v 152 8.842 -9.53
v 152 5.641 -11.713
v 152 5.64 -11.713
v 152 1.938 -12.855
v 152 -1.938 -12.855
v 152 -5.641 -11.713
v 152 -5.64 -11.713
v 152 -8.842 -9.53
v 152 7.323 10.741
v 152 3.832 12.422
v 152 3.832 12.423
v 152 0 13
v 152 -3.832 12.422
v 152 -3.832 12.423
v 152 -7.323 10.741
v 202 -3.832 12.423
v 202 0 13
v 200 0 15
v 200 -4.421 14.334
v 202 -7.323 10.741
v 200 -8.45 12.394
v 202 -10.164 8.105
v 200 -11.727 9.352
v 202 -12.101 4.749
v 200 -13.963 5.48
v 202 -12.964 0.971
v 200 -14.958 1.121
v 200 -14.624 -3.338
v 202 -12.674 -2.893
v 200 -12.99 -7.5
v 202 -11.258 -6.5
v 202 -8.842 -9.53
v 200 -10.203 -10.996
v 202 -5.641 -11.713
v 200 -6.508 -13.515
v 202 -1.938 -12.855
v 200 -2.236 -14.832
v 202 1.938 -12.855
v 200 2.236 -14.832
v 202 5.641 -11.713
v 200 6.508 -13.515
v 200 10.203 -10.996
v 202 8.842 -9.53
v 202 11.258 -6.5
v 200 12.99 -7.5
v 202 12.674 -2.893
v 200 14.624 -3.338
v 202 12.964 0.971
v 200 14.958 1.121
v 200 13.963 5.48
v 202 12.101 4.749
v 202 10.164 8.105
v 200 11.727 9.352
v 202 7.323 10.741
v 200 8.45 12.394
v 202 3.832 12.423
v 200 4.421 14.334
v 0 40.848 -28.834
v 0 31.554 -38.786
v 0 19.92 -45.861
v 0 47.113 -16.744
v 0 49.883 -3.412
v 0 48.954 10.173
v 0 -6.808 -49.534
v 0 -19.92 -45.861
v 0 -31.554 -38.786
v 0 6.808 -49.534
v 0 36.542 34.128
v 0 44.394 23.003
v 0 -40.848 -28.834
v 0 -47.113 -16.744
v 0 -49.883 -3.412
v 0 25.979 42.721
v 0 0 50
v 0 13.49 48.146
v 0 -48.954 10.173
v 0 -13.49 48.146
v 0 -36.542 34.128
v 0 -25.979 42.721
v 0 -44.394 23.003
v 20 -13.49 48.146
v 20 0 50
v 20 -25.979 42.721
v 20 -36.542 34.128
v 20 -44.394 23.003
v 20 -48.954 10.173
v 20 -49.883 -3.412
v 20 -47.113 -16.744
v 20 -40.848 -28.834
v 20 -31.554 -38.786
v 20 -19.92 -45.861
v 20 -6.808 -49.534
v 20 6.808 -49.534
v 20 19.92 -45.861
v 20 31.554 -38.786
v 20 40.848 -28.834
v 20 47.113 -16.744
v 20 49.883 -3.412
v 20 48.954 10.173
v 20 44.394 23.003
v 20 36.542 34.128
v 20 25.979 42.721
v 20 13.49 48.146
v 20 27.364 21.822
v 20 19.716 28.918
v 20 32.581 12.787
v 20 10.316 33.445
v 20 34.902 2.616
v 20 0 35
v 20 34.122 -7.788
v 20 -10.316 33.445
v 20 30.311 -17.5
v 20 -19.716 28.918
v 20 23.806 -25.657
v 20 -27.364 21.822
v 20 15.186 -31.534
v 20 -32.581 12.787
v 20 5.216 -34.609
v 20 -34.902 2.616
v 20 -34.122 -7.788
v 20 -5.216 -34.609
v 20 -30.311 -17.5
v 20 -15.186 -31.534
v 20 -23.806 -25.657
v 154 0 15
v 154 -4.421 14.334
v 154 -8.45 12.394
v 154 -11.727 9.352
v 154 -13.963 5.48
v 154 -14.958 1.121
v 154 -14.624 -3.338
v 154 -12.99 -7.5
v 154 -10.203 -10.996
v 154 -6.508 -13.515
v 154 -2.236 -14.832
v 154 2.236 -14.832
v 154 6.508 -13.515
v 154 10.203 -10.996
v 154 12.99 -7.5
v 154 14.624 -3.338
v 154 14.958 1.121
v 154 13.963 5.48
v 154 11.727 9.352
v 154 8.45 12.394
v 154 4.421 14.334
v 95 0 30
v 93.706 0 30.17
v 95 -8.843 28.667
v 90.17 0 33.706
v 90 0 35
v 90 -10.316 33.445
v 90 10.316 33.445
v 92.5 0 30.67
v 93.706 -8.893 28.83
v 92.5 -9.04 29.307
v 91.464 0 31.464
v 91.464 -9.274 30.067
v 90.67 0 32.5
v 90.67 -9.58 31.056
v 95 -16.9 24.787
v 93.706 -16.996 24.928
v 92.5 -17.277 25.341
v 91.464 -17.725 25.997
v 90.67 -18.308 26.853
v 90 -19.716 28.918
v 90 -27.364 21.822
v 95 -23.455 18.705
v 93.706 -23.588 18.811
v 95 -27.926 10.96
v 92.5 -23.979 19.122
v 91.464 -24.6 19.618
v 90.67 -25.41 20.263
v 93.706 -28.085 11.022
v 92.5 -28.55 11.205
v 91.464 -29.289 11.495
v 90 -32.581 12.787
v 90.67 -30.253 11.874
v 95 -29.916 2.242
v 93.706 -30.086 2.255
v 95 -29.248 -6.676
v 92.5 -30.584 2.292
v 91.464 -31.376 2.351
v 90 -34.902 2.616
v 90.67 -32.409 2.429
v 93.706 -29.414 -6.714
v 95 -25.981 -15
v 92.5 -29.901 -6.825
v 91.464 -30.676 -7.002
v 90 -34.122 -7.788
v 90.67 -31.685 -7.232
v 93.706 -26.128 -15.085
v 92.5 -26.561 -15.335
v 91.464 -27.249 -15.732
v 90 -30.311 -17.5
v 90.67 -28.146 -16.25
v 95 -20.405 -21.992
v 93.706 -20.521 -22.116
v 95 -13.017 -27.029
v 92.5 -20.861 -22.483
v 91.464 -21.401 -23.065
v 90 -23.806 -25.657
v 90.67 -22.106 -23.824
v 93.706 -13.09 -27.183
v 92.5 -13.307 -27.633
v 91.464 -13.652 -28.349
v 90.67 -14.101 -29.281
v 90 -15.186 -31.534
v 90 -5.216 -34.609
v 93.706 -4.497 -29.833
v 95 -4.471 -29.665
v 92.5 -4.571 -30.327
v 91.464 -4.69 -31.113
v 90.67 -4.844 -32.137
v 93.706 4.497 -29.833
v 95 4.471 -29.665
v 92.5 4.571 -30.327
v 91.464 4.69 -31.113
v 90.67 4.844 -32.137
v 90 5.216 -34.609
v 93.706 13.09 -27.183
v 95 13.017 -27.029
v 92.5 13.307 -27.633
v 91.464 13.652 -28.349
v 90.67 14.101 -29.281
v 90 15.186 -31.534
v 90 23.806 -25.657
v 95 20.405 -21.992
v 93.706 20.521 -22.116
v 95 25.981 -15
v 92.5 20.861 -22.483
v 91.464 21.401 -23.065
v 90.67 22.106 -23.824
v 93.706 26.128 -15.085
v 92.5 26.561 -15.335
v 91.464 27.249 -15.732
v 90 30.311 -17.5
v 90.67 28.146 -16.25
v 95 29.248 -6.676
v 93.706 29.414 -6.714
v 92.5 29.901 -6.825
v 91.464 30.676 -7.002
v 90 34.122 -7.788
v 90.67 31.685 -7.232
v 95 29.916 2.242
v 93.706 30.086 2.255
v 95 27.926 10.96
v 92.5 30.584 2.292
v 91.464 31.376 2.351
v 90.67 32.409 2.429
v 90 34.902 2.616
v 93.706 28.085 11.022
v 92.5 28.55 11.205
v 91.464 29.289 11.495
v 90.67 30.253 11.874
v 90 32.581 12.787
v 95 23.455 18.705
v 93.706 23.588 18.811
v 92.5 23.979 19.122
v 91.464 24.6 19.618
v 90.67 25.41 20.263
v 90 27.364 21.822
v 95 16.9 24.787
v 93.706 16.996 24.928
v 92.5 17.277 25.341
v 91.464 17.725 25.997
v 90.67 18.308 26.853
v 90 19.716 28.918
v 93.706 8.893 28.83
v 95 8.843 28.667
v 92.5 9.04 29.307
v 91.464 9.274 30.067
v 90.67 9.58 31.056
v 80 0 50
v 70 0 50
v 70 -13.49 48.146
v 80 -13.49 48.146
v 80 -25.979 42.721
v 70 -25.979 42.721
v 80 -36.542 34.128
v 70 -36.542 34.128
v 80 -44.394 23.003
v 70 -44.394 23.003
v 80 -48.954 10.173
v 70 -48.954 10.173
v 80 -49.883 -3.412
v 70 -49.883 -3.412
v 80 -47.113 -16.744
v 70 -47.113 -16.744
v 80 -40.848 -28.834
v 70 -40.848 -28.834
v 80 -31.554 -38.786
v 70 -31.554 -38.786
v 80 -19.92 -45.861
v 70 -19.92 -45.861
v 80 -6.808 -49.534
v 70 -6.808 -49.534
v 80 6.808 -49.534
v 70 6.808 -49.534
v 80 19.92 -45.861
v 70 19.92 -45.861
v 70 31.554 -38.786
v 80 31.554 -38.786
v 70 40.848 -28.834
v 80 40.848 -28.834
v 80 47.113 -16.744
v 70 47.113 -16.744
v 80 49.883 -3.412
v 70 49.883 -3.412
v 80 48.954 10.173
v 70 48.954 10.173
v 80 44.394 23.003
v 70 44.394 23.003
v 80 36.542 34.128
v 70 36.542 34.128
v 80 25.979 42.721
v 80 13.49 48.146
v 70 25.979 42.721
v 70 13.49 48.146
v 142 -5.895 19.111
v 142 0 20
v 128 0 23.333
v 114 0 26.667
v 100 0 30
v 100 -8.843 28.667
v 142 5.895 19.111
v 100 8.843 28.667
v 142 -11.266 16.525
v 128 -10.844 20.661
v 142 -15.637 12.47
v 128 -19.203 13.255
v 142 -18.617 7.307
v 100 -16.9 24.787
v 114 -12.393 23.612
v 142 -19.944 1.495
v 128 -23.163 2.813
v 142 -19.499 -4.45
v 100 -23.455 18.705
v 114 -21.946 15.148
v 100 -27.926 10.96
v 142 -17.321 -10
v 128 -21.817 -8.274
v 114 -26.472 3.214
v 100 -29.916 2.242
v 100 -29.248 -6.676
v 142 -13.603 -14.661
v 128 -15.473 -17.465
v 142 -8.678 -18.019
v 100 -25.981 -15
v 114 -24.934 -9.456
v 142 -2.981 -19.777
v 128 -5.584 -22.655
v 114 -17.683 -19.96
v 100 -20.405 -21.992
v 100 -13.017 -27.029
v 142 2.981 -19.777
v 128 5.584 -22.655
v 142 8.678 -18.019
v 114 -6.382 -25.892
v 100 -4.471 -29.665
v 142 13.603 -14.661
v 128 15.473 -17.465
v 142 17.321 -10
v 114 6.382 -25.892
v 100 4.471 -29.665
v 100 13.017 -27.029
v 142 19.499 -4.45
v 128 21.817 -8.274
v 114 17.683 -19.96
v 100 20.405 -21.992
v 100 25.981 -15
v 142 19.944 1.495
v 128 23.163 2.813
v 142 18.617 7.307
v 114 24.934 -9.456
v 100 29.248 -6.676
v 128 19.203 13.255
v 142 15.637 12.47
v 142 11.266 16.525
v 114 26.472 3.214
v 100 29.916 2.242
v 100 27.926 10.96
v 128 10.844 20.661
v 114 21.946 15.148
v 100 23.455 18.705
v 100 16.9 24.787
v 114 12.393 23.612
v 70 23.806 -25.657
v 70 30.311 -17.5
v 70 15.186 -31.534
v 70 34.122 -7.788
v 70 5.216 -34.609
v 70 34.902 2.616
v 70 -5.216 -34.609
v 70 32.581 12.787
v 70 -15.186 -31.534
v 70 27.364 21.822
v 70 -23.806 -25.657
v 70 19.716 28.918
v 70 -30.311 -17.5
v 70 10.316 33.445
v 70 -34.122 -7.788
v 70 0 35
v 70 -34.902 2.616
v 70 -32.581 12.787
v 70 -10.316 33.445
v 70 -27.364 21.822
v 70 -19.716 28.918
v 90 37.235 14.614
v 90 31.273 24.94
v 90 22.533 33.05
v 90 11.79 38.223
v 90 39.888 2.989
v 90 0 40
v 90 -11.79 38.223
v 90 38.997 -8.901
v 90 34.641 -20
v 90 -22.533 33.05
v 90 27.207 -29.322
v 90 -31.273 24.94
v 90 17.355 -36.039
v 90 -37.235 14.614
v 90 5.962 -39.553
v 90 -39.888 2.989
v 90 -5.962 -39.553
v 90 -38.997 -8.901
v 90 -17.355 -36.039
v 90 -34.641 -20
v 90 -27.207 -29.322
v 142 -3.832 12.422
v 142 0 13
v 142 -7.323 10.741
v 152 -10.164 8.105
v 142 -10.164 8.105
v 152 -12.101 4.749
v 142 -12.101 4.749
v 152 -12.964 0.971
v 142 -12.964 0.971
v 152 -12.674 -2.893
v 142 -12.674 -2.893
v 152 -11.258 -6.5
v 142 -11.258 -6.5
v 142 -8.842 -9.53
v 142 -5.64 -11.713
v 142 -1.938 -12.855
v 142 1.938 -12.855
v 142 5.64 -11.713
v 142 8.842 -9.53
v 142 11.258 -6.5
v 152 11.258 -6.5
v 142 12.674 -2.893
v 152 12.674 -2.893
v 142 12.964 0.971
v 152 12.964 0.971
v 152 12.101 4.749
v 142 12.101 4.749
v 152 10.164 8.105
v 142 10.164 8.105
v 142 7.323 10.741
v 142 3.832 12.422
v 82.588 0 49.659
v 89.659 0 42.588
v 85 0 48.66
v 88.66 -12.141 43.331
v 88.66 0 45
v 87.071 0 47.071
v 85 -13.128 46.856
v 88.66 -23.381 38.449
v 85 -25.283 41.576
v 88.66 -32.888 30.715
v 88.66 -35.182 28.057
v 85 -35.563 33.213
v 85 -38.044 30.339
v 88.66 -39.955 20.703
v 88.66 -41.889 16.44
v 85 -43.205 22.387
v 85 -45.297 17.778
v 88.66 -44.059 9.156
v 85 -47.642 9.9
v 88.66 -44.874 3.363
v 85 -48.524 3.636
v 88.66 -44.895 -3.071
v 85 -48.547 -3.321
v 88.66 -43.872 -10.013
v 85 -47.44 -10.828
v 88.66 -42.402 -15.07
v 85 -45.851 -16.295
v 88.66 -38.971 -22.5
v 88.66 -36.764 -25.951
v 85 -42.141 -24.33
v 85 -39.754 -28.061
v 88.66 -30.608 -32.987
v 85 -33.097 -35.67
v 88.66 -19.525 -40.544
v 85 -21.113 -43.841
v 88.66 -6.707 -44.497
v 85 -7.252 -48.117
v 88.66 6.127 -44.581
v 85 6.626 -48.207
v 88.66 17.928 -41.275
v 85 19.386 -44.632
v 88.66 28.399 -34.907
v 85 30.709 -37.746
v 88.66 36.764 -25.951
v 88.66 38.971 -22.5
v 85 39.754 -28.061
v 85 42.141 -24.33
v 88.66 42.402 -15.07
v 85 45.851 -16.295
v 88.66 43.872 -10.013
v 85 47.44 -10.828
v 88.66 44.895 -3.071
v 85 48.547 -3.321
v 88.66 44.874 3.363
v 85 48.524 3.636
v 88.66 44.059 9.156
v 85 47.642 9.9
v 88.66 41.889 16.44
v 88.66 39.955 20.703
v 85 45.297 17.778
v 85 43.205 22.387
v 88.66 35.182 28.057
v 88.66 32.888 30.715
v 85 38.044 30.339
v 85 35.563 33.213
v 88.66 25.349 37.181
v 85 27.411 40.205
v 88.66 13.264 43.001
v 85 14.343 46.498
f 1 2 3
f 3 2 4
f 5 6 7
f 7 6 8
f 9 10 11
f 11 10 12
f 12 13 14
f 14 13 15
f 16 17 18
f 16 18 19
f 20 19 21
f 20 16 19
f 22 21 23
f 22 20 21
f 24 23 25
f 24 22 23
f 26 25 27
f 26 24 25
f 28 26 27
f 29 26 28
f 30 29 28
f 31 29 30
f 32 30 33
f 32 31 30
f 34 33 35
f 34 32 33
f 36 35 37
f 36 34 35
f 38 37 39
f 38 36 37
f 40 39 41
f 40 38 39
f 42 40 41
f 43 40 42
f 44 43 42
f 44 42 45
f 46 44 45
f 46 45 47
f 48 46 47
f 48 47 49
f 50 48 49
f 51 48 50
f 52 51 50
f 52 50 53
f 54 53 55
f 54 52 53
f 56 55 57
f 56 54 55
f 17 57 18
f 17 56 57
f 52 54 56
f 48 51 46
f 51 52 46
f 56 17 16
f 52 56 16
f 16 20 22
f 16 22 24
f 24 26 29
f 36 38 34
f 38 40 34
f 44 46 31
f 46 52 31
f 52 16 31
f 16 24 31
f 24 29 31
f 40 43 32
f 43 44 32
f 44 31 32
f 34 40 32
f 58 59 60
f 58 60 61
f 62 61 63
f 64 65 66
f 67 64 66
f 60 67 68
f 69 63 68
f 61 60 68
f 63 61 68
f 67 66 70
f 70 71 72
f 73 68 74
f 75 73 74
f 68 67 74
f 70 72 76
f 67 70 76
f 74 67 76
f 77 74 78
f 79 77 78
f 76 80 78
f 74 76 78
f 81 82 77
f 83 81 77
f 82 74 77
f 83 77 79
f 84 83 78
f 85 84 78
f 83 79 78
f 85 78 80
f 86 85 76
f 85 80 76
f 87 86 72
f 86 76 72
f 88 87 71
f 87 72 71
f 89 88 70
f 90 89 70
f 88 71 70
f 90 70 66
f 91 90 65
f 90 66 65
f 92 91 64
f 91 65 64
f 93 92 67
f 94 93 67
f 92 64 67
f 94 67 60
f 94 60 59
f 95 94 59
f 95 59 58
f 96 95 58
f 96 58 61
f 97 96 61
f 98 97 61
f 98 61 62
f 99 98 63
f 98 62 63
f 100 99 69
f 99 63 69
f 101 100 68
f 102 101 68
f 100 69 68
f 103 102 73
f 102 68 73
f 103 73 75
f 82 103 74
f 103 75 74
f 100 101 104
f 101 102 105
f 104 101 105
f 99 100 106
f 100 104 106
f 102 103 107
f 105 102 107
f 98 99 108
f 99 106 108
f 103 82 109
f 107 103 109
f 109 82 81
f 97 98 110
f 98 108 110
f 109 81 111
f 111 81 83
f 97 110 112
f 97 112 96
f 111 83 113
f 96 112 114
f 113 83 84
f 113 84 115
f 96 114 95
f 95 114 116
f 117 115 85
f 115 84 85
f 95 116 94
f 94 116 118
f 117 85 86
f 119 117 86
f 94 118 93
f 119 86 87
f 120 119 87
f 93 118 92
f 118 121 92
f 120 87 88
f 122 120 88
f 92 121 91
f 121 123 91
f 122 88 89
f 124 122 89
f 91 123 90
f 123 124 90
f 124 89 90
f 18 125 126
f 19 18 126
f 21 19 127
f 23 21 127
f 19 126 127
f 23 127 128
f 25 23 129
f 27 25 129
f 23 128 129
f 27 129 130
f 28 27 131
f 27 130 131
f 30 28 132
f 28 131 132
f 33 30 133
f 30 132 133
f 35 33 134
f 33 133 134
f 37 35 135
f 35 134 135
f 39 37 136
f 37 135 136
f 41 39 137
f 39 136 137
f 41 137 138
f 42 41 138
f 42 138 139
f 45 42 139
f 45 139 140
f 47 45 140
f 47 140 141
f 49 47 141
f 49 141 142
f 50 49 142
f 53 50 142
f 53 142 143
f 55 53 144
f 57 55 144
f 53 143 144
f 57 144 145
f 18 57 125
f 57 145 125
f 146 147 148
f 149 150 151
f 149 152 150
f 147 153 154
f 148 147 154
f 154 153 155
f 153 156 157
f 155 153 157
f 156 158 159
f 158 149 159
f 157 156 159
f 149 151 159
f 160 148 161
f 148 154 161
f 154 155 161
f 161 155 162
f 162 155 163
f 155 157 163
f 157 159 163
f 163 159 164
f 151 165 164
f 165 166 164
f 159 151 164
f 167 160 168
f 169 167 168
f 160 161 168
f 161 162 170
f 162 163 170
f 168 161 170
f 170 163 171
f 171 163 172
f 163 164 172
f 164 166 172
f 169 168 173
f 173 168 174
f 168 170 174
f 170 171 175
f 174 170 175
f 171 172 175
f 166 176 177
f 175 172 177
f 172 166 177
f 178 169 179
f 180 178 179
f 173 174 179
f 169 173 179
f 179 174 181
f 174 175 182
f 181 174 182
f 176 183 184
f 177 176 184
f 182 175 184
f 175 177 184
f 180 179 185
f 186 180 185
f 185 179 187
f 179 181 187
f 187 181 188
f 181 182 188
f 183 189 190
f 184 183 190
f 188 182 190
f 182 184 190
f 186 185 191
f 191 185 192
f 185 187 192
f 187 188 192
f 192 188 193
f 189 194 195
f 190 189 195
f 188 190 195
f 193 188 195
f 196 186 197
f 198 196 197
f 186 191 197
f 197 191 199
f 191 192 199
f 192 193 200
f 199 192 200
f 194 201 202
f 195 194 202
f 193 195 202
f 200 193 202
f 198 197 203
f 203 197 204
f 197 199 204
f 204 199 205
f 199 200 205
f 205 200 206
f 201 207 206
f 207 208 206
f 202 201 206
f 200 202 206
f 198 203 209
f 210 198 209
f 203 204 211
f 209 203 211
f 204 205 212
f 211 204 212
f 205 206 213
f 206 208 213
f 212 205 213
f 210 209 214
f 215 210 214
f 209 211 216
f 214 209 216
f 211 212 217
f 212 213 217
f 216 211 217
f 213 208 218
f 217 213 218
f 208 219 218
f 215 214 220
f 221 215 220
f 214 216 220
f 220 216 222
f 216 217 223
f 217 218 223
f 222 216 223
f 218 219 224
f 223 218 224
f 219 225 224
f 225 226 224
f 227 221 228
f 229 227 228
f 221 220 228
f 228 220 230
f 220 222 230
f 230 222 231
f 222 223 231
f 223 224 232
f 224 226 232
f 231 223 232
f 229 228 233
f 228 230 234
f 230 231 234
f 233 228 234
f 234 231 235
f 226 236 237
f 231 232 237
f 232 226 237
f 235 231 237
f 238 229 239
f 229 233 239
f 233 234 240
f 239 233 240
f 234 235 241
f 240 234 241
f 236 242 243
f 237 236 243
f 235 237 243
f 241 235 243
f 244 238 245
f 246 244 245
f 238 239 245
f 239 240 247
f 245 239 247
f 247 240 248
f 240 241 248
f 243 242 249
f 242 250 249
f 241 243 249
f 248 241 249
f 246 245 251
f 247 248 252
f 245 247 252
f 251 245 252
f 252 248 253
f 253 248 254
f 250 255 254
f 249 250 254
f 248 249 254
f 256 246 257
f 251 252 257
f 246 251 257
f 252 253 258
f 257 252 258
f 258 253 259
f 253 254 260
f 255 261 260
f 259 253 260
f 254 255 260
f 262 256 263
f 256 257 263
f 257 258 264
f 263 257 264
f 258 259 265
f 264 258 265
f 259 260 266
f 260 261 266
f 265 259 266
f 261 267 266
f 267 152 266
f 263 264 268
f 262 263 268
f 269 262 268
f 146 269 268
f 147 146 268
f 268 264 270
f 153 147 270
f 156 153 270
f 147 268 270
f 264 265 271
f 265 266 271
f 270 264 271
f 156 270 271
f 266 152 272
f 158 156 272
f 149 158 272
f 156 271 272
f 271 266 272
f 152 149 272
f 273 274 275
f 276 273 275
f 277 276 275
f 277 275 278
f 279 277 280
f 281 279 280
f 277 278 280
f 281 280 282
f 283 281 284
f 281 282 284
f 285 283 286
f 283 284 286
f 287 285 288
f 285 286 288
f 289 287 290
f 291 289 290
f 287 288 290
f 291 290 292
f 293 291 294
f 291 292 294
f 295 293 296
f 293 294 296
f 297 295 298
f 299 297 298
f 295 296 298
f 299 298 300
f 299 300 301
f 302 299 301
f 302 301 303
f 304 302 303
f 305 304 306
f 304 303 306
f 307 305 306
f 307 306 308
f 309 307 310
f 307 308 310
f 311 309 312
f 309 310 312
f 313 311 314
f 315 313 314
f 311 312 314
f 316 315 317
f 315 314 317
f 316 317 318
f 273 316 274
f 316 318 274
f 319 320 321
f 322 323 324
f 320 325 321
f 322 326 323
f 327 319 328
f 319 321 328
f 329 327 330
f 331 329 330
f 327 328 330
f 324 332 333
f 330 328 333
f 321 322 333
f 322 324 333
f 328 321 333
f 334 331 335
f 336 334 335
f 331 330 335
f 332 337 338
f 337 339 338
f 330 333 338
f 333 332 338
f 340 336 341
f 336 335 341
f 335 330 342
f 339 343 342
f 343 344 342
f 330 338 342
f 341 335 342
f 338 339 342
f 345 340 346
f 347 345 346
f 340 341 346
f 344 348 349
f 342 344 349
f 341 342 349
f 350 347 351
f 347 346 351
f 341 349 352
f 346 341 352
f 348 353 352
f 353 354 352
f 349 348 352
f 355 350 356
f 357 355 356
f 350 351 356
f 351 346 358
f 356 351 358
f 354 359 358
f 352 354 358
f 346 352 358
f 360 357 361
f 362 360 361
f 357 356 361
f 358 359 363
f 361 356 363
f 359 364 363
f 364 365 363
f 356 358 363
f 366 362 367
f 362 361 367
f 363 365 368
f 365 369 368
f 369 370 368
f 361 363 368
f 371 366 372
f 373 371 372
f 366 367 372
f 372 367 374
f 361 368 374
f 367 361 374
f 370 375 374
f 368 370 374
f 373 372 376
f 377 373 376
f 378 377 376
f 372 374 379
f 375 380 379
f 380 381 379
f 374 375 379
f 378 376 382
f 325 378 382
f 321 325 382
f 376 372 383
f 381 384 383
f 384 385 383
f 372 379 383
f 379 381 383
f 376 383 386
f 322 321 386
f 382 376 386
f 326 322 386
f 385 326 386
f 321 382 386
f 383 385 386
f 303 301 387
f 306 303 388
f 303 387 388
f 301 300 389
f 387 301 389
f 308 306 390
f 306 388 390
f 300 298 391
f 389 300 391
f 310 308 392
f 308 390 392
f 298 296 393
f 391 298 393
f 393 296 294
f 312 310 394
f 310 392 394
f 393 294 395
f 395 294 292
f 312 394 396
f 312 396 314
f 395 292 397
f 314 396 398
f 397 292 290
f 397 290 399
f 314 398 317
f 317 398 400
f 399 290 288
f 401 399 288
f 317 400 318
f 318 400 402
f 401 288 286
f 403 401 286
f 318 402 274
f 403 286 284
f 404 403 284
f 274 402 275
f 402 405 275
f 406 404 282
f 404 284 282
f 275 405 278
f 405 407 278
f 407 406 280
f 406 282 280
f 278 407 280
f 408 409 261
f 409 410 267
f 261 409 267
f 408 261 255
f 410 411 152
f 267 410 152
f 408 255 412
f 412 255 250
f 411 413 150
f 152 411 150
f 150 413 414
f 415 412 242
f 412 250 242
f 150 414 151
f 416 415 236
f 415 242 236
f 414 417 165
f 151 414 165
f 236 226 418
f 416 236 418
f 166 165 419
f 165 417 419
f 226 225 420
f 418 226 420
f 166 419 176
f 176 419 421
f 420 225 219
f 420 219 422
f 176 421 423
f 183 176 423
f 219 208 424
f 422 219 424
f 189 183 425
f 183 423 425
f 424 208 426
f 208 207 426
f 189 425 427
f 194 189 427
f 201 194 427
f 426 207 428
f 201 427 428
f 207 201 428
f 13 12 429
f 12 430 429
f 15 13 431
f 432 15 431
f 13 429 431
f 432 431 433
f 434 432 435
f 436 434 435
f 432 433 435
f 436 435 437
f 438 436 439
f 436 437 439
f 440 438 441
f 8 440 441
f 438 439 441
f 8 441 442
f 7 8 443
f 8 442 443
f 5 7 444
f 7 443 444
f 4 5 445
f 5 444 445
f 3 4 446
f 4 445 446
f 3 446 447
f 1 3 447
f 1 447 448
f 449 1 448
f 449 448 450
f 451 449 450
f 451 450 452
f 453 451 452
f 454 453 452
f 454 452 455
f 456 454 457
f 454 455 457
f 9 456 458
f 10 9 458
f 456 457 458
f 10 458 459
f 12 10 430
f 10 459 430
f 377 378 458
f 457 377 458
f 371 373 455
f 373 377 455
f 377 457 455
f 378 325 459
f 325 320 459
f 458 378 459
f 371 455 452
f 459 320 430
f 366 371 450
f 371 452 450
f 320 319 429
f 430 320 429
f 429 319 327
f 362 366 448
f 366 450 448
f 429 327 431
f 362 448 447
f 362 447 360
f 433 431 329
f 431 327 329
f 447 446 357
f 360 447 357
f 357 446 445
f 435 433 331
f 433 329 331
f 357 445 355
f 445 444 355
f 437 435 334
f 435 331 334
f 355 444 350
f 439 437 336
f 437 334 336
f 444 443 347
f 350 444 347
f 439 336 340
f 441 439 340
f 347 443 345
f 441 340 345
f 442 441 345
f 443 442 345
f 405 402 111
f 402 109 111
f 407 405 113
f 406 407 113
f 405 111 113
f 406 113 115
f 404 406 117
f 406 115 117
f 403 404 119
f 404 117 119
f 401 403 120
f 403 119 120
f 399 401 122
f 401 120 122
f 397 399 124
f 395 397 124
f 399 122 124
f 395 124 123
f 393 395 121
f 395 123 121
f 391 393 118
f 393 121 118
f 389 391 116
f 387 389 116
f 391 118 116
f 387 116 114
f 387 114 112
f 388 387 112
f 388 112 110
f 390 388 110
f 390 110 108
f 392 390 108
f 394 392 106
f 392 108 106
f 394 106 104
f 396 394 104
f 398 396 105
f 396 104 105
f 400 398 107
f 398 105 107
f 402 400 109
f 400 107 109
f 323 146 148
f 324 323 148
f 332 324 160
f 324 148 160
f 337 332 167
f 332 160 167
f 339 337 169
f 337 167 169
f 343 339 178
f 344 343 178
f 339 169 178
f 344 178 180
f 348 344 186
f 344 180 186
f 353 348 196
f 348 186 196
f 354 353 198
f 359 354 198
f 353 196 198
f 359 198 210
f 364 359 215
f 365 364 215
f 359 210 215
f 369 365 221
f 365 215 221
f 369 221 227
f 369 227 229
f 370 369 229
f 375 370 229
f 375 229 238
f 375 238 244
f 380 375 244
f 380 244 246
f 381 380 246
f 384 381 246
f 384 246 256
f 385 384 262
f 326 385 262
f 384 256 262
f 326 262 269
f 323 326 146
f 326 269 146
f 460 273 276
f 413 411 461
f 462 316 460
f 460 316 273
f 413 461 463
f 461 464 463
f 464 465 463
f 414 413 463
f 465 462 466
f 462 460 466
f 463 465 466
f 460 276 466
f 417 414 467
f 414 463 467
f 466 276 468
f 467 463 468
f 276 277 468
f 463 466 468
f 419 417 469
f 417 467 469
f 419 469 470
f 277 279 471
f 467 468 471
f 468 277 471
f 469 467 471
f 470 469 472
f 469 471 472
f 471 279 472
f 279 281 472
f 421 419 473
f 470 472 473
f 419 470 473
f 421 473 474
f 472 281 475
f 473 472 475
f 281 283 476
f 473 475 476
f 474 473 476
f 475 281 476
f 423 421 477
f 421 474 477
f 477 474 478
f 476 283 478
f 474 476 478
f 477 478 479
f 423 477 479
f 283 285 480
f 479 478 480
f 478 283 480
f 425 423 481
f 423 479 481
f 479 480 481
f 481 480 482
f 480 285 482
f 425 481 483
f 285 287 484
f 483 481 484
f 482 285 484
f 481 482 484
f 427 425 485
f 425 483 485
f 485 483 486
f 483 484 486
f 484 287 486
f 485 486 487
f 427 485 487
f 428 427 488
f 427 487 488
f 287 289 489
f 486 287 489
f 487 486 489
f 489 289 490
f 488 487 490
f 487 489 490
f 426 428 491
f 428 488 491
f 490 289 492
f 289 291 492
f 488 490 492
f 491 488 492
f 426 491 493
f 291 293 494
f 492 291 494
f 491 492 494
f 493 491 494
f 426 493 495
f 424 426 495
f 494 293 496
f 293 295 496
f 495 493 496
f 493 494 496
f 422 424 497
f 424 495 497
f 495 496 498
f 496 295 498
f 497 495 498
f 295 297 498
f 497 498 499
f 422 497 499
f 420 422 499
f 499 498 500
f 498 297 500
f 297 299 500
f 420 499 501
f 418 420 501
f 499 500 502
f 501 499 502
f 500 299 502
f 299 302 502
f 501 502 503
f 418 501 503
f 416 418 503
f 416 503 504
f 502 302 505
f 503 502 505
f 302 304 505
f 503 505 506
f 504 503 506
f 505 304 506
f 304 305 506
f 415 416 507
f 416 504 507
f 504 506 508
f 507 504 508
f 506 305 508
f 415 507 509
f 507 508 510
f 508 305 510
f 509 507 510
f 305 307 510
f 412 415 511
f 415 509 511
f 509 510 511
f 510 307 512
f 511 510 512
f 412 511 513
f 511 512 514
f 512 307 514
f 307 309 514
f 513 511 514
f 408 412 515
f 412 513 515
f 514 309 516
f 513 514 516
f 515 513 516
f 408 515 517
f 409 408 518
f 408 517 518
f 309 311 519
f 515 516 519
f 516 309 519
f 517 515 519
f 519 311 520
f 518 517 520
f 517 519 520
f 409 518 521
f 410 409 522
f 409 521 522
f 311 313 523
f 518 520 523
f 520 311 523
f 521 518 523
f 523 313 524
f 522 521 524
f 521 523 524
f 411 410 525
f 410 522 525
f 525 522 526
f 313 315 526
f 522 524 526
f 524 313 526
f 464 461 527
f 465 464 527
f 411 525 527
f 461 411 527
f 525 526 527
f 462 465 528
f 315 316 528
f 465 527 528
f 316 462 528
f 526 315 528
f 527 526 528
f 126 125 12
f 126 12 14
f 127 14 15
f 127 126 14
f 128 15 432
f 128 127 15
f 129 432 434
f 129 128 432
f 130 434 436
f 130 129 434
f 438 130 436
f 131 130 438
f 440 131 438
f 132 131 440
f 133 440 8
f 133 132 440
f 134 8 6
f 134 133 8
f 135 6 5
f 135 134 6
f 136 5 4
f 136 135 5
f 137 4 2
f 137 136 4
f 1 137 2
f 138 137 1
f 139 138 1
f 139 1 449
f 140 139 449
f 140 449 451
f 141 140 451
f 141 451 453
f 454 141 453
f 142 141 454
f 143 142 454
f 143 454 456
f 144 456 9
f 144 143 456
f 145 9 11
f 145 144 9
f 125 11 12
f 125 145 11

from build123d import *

# Parameters (mm, degrees)
FILLET1_R     = 5
FILLET2_R     = 10
CHAMFER1_SIZE = 2


with BuildPart() as part:
    # Sketch1 → Revolve1 (revolve)
    with BuildSketch(Plane.XY, mode=Mode.PRIVATE) as revolve1_sk:
        Polygon((0, 0), (202, 0), (202, 15), (152, 15), (152, 13), (142, 13), (142, 20), (100, 30), (90, 30), (90, 50), (70, 50), (70, 35), (20, 35), (20, 50), (0, 50), align=None)
    revolve(revolve1_sk.sketch.rotate(Axis((0, 0, 0), (1, 0, 0)), 90), axis=Axis((0, 0, 0), (1, 0, 0)))

    # Fillet1
    fillet1_edges = [part.edges().sort_by_distance(p)[0] for p in [
        (90, 0, -30),
    ]]
    fillet(fillet1_edges, radius=FILLET1_R)

    # Fillet2
    fillet2_edges = [part.edges().sort_by_distance(p)[0] for p in [
        (90, 0, -50),
    ]]
    fillet(fillet2_edges, radius=FILLET2_R)

    # Chamfer1
    chamfer1_edges = [part.edges().sort_by_distance(p)[0] for p in [
        (152, 0, -15),
        (202, 0, -15),
    ]]
    chamfer(chamfer1_edges, length=CHAMFER1_SIZE - 0.0001)  # a hair under: the kernel refuses the full size


solid = part.part
